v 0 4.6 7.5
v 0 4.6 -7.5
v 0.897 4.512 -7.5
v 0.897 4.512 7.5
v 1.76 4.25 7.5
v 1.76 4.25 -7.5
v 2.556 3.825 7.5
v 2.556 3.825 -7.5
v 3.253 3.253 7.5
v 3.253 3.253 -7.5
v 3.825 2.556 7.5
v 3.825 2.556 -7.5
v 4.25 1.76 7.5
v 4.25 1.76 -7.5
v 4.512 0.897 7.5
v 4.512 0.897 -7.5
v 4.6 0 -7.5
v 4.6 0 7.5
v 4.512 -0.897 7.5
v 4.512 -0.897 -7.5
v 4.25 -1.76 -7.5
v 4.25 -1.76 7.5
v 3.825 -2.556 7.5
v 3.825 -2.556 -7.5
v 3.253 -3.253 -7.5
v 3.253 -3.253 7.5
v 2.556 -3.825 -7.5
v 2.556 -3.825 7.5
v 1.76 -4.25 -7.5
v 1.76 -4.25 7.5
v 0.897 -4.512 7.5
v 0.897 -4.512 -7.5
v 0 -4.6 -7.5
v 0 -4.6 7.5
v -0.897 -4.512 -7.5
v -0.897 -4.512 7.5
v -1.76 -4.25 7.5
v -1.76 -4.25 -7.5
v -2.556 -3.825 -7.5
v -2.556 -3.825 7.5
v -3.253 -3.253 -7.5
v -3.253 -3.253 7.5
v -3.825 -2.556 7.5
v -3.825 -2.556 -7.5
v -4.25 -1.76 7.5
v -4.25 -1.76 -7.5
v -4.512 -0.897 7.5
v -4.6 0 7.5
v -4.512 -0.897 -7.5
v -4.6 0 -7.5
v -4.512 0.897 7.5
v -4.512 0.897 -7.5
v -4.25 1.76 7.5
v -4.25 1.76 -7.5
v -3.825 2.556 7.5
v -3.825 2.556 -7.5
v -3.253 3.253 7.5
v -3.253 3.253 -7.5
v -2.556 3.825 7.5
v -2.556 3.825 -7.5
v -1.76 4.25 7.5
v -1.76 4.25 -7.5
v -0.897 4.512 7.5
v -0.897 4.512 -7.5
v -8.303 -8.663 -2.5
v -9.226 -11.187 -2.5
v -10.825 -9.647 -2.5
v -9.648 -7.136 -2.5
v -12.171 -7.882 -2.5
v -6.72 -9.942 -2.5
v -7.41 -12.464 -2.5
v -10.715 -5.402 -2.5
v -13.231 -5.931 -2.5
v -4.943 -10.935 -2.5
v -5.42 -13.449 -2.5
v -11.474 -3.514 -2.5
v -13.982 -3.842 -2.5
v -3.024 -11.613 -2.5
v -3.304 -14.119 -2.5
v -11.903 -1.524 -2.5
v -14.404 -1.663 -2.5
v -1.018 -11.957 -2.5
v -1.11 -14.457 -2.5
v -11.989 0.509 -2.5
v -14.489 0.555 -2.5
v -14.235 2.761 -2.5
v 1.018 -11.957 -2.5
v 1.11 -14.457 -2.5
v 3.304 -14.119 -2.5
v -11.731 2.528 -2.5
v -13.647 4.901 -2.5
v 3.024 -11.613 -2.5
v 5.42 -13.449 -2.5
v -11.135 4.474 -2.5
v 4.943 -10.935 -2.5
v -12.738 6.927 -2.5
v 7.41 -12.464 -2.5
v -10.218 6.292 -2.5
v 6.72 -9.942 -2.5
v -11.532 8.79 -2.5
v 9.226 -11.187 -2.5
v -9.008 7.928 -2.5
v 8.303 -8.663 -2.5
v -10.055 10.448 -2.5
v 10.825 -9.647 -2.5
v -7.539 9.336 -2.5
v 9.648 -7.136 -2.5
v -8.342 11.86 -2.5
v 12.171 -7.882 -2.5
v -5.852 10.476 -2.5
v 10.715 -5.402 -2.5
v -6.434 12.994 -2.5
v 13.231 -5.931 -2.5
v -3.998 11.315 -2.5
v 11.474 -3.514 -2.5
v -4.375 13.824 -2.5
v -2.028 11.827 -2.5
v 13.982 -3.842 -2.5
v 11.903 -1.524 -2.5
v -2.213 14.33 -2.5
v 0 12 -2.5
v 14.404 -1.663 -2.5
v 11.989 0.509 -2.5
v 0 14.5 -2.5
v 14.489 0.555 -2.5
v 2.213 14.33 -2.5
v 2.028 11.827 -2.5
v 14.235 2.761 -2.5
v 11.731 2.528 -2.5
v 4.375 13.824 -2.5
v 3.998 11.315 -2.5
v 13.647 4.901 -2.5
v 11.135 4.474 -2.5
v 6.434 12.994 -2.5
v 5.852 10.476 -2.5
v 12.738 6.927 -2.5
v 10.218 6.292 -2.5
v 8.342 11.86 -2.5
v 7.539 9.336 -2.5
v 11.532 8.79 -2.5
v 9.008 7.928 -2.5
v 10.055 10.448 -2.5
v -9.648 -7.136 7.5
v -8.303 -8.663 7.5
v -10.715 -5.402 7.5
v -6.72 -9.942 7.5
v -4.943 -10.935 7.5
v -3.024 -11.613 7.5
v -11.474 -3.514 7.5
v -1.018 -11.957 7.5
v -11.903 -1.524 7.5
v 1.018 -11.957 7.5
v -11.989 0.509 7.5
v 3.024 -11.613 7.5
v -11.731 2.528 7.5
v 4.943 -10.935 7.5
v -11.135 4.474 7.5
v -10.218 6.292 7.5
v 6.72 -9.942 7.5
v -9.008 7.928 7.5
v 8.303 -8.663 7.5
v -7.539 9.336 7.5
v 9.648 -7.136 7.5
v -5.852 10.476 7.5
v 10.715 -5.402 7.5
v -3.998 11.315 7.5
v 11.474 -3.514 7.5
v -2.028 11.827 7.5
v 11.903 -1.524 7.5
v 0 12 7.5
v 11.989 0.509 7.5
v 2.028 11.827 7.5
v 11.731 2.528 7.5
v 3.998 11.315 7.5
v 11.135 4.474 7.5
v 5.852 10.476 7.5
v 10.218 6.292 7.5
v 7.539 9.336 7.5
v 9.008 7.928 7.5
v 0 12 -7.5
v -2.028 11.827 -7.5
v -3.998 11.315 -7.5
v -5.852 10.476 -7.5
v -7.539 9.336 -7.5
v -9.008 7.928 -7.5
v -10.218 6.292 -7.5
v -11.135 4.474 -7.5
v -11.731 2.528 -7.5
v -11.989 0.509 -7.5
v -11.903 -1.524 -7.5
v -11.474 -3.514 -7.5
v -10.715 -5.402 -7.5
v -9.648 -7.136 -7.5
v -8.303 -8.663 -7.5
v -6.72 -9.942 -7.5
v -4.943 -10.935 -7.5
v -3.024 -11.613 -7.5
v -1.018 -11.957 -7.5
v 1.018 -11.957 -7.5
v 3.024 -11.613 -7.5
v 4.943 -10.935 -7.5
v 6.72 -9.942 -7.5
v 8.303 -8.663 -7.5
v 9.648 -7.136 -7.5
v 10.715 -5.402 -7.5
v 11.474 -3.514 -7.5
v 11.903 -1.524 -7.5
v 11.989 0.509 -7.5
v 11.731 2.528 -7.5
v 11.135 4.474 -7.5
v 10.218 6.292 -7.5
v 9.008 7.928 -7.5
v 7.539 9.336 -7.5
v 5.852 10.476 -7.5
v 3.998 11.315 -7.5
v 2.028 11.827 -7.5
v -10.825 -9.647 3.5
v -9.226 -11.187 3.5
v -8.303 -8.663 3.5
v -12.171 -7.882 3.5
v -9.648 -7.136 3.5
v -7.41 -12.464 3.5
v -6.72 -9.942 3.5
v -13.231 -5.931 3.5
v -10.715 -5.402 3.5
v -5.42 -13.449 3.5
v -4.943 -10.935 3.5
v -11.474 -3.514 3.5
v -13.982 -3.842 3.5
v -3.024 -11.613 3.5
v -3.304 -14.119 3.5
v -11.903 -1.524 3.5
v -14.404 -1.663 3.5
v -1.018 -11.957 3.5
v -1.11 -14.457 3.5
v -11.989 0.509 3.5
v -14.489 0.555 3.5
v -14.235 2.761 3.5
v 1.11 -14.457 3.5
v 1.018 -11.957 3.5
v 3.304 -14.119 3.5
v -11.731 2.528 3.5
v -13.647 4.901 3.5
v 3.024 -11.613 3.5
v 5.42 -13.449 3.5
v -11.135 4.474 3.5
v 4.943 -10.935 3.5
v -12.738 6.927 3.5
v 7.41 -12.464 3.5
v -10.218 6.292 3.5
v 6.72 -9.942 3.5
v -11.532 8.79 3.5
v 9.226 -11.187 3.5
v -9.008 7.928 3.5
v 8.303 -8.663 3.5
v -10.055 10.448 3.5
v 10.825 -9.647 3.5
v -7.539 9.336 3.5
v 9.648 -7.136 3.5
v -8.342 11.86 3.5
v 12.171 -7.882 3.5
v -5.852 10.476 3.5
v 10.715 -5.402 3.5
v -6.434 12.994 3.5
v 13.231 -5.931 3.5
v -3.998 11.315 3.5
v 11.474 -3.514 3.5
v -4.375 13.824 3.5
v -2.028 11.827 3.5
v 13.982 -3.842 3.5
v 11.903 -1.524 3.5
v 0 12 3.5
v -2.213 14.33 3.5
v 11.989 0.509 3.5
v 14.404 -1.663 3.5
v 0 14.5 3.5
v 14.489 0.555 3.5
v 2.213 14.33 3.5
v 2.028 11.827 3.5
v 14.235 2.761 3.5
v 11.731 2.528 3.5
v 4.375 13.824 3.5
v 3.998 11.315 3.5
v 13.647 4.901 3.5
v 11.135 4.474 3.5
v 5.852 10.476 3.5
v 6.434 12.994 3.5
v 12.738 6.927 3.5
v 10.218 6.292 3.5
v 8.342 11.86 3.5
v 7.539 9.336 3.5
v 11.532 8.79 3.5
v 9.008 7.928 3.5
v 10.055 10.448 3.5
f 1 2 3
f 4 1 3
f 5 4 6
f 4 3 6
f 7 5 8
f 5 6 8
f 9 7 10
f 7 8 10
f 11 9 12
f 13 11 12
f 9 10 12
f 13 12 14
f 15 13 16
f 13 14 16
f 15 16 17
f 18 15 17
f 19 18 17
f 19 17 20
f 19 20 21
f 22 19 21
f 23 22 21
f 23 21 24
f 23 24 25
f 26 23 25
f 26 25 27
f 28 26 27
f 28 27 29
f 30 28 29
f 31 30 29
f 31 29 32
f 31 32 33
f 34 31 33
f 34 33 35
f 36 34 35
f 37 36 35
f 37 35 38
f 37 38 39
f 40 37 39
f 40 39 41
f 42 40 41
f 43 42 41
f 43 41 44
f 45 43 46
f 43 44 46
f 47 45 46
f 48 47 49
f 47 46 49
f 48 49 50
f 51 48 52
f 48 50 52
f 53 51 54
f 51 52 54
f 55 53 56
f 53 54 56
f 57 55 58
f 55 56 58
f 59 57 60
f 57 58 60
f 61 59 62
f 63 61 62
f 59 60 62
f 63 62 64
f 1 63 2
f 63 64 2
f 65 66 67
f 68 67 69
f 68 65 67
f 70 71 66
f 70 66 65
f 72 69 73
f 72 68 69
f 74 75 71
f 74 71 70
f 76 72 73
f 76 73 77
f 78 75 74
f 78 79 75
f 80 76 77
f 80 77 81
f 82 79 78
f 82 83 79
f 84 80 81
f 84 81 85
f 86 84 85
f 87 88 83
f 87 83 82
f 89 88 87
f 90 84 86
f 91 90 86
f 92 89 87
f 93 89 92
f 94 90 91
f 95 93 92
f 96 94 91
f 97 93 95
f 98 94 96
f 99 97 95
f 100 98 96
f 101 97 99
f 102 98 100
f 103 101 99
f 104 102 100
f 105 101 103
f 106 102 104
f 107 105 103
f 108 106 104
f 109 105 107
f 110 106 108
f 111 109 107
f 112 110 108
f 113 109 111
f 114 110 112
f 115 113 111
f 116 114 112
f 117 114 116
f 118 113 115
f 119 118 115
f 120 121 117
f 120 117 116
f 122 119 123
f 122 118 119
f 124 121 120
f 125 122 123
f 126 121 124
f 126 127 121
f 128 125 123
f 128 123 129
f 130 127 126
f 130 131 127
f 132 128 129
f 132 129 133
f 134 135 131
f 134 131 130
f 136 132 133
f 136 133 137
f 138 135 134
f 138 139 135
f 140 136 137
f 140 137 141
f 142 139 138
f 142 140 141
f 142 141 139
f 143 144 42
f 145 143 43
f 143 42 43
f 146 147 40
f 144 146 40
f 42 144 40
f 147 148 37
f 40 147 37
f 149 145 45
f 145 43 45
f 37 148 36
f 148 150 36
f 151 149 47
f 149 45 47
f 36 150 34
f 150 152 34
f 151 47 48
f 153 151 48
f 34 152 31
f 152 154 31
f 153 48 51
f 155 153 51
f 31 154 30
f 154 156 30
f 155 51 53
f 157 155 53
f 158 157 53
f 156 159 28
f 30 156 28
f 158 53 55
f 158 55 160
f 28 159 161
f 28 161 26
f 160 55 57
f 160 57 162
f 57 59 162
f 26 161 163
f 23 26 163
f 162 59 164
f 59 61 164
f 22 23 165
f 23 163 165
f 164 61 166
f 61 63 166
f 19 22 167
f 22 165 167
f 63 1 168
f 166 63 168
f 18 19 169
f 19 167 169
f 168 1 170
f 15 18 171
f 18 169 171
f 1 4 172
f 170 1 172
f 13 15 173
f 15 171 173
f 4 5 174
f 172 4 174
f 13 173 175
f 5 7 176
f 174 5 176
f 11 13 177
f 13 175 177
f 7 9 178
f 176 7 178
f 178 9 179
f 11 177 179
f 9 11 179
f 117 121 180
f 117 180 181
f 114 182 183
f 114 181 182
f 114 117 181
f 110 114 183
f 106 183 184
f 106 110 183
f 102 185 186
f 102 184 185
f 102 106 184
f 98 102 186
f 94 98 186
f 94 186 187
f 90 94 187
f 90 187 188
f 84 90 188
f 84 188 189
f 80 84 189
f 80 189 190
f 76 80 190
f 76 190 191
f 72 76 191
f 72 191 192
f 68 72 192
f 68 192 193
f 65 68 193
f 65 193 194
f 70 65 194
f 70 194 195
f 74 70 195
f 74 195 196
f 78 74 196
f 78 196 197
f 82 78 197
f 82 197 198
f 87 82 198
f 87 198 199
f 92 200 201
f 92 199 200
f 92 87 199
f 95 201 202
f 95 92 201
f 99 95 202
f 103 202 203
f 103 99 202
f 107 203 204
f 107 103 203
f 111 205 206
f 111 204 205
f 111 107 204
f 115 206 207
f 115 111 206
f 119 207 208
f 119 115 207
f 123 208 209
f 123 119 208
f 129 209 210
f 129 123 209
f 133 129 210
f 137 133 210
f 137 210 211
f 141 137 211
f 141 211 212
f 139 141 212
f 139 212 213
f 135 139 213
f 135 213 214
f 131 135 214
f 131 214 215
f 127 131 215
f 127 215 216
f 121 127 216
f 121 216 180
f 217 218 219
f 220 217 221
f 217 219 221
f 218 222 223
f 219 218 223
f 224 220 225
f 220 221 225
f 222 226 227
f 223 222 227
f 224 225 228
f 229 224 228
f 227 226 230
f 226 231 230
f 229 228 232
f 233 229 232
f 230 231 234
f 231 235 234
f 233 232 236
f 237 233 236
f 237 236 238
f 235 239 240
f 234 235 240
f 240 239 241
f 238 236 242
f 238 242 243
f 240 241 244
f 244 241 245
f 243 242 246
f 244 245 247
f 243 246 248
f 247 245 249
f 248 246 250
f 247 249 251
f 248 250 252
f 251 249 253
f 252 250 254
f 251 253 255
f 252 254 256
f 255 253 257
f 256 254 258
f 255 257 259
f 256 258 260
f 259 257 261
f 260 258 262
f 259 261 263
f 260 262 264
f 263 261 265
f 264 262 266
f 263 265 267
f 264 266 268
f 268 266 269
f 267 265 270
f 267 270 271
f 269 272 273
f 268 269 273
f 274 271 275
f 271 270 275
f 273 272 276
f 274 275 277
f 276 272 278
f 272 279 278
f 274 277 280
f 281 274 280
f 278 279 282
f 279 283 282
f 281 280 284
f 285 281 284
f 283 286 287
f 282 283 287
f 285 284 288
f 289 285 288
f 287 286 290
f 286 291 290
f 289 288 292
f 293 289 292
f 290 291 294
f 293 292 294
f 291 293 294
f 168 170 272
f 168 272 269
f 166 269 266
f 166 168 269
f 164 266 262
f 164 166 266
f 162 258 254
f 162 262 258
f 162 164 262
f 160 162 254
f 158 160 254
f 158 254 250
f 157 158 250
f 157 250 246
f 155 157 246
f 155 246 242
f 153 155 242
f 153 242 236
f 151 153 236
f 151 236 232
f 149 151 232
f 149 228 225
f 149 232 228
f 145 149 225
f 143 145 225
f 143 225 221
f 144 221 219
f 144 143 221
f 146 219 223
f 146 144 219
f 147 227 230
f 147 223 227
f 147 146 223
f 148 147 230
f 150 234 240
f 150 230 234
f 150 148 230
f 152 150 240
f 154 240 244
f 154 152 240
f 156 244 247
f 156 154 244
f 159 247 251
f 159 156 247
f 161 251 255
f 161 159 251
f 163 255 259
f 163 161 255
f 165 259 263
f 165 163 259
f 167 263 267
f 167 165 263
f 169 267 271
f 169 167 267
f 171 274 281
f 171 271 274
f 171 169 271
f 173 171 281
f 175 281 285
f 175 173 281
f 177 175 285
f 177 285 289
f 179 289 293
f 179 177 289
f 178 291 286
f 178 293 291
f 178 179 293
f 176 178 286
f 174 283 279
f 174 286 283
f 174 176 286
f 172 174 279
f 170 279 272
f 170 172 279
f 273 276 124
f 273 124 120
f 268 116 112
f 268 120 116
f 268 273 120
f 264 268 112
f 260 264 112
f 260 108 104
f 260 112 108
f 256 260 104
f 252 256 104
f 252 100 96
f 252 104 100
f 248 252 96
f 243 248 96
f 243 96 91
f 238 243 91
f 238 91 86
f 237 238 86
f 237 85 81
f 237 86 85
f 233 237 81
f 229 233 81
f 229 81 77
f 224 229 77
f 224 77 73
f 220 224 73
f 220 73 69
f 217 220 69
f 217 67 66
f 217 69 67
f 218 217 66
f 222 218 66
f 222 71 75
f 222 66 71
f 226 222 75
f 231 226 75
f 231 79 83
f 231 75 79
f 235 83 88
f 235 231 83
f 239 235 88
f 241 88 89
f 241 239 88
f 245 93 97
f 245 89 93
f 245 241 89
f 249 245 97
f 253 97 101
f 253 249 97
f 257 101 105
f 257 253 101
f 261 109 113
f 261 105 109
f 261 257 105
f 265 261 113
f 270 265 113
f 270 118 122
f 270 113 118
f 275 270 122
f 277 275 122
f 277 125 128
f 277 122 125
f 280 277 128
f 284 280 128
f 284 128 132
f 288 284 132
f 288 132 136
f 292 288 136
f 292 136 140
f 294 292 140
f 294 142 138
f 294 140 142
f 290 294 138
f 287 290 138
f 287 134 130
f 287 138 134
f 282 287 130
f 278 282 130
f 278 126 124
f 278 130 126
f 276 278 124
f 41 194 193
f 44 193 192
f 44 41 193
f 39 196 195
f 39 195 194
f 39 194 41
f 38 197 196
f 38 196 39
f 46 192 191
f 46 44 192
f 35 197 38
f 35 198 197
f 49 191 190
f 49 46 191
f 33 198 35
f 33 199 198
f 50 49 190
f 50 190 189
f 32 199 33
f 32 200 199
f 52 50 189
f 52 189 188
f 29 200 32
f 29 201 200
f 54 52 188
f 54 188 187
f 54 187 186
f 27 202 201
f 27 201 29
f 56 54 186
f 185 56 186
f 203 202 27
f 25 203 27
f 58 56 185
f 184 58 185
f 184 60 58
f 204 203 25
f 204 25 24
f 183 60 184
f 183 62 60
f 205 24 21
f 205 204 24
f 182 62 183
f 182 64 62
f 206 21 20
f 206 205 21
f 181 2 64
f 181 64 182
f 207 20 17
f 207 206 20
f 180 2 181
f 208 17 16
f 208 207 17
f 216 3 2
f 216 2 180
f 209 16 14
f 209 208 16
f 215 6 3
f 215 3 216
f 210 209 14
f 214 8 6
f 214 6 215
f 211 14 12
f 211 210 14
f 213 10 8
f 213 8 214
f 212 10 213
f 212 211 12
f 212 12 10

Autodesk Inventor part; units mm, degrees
sketch "Sketch_1" plane through (0, 0, 0) normal (1, 0, 0) x (0, 1, 0)
  line L0 (0, -7.5) -> (0, 7.5)
  line L1 (4.6, 7.5) -> (4.6, -7.5)
  line L2 (4.6, -7.5) -> (12, -7.5)
  line L3 (12, -7.5) -> (12, -2.5)
  line L4 (12, -2.5) -> (14.5, -2.5)
  line L5 (14.5, -2.5) -> (14.5, 3.5)
  line L6 (14.5, 3.5) -> (12, 3.5)
  line L7 (12, 3.5) -> (12, 7.5)
  line L8 (12, 7.5) -> (4.6, 7.5)
revolve "Revolution1" add sketch "Sketch_1" angle 360 about axis through (0, 0, -7.5) along (0, 0, -1)
ref_plane "1_XY" through (0, 0, -7.5) normal (0, 0, 1) x (1, 0, 0)
ref_plane "1_YZ" through (0, 0, -7.5) normal (1, 0, 0) x (0, 1, 0)
ref_plane "1_ZX" through (0, 0, -7.5) normal (0, 1, 0) x (0, 0, 1)
ref_plane "2_XY" through (0, 0, 7.5) normal (0, 0, 1) x (1, 0, 0)
ref_plane "2_YZ" through (0, 0, 7.5) normal (1, 0, 0) x (0, 1, 0)
ref_plane "2_ZX" through (0, 0, 7.5) normal (0, 1, 0) x (0, 0, 1)
properties part number "HFROLL5_b"
